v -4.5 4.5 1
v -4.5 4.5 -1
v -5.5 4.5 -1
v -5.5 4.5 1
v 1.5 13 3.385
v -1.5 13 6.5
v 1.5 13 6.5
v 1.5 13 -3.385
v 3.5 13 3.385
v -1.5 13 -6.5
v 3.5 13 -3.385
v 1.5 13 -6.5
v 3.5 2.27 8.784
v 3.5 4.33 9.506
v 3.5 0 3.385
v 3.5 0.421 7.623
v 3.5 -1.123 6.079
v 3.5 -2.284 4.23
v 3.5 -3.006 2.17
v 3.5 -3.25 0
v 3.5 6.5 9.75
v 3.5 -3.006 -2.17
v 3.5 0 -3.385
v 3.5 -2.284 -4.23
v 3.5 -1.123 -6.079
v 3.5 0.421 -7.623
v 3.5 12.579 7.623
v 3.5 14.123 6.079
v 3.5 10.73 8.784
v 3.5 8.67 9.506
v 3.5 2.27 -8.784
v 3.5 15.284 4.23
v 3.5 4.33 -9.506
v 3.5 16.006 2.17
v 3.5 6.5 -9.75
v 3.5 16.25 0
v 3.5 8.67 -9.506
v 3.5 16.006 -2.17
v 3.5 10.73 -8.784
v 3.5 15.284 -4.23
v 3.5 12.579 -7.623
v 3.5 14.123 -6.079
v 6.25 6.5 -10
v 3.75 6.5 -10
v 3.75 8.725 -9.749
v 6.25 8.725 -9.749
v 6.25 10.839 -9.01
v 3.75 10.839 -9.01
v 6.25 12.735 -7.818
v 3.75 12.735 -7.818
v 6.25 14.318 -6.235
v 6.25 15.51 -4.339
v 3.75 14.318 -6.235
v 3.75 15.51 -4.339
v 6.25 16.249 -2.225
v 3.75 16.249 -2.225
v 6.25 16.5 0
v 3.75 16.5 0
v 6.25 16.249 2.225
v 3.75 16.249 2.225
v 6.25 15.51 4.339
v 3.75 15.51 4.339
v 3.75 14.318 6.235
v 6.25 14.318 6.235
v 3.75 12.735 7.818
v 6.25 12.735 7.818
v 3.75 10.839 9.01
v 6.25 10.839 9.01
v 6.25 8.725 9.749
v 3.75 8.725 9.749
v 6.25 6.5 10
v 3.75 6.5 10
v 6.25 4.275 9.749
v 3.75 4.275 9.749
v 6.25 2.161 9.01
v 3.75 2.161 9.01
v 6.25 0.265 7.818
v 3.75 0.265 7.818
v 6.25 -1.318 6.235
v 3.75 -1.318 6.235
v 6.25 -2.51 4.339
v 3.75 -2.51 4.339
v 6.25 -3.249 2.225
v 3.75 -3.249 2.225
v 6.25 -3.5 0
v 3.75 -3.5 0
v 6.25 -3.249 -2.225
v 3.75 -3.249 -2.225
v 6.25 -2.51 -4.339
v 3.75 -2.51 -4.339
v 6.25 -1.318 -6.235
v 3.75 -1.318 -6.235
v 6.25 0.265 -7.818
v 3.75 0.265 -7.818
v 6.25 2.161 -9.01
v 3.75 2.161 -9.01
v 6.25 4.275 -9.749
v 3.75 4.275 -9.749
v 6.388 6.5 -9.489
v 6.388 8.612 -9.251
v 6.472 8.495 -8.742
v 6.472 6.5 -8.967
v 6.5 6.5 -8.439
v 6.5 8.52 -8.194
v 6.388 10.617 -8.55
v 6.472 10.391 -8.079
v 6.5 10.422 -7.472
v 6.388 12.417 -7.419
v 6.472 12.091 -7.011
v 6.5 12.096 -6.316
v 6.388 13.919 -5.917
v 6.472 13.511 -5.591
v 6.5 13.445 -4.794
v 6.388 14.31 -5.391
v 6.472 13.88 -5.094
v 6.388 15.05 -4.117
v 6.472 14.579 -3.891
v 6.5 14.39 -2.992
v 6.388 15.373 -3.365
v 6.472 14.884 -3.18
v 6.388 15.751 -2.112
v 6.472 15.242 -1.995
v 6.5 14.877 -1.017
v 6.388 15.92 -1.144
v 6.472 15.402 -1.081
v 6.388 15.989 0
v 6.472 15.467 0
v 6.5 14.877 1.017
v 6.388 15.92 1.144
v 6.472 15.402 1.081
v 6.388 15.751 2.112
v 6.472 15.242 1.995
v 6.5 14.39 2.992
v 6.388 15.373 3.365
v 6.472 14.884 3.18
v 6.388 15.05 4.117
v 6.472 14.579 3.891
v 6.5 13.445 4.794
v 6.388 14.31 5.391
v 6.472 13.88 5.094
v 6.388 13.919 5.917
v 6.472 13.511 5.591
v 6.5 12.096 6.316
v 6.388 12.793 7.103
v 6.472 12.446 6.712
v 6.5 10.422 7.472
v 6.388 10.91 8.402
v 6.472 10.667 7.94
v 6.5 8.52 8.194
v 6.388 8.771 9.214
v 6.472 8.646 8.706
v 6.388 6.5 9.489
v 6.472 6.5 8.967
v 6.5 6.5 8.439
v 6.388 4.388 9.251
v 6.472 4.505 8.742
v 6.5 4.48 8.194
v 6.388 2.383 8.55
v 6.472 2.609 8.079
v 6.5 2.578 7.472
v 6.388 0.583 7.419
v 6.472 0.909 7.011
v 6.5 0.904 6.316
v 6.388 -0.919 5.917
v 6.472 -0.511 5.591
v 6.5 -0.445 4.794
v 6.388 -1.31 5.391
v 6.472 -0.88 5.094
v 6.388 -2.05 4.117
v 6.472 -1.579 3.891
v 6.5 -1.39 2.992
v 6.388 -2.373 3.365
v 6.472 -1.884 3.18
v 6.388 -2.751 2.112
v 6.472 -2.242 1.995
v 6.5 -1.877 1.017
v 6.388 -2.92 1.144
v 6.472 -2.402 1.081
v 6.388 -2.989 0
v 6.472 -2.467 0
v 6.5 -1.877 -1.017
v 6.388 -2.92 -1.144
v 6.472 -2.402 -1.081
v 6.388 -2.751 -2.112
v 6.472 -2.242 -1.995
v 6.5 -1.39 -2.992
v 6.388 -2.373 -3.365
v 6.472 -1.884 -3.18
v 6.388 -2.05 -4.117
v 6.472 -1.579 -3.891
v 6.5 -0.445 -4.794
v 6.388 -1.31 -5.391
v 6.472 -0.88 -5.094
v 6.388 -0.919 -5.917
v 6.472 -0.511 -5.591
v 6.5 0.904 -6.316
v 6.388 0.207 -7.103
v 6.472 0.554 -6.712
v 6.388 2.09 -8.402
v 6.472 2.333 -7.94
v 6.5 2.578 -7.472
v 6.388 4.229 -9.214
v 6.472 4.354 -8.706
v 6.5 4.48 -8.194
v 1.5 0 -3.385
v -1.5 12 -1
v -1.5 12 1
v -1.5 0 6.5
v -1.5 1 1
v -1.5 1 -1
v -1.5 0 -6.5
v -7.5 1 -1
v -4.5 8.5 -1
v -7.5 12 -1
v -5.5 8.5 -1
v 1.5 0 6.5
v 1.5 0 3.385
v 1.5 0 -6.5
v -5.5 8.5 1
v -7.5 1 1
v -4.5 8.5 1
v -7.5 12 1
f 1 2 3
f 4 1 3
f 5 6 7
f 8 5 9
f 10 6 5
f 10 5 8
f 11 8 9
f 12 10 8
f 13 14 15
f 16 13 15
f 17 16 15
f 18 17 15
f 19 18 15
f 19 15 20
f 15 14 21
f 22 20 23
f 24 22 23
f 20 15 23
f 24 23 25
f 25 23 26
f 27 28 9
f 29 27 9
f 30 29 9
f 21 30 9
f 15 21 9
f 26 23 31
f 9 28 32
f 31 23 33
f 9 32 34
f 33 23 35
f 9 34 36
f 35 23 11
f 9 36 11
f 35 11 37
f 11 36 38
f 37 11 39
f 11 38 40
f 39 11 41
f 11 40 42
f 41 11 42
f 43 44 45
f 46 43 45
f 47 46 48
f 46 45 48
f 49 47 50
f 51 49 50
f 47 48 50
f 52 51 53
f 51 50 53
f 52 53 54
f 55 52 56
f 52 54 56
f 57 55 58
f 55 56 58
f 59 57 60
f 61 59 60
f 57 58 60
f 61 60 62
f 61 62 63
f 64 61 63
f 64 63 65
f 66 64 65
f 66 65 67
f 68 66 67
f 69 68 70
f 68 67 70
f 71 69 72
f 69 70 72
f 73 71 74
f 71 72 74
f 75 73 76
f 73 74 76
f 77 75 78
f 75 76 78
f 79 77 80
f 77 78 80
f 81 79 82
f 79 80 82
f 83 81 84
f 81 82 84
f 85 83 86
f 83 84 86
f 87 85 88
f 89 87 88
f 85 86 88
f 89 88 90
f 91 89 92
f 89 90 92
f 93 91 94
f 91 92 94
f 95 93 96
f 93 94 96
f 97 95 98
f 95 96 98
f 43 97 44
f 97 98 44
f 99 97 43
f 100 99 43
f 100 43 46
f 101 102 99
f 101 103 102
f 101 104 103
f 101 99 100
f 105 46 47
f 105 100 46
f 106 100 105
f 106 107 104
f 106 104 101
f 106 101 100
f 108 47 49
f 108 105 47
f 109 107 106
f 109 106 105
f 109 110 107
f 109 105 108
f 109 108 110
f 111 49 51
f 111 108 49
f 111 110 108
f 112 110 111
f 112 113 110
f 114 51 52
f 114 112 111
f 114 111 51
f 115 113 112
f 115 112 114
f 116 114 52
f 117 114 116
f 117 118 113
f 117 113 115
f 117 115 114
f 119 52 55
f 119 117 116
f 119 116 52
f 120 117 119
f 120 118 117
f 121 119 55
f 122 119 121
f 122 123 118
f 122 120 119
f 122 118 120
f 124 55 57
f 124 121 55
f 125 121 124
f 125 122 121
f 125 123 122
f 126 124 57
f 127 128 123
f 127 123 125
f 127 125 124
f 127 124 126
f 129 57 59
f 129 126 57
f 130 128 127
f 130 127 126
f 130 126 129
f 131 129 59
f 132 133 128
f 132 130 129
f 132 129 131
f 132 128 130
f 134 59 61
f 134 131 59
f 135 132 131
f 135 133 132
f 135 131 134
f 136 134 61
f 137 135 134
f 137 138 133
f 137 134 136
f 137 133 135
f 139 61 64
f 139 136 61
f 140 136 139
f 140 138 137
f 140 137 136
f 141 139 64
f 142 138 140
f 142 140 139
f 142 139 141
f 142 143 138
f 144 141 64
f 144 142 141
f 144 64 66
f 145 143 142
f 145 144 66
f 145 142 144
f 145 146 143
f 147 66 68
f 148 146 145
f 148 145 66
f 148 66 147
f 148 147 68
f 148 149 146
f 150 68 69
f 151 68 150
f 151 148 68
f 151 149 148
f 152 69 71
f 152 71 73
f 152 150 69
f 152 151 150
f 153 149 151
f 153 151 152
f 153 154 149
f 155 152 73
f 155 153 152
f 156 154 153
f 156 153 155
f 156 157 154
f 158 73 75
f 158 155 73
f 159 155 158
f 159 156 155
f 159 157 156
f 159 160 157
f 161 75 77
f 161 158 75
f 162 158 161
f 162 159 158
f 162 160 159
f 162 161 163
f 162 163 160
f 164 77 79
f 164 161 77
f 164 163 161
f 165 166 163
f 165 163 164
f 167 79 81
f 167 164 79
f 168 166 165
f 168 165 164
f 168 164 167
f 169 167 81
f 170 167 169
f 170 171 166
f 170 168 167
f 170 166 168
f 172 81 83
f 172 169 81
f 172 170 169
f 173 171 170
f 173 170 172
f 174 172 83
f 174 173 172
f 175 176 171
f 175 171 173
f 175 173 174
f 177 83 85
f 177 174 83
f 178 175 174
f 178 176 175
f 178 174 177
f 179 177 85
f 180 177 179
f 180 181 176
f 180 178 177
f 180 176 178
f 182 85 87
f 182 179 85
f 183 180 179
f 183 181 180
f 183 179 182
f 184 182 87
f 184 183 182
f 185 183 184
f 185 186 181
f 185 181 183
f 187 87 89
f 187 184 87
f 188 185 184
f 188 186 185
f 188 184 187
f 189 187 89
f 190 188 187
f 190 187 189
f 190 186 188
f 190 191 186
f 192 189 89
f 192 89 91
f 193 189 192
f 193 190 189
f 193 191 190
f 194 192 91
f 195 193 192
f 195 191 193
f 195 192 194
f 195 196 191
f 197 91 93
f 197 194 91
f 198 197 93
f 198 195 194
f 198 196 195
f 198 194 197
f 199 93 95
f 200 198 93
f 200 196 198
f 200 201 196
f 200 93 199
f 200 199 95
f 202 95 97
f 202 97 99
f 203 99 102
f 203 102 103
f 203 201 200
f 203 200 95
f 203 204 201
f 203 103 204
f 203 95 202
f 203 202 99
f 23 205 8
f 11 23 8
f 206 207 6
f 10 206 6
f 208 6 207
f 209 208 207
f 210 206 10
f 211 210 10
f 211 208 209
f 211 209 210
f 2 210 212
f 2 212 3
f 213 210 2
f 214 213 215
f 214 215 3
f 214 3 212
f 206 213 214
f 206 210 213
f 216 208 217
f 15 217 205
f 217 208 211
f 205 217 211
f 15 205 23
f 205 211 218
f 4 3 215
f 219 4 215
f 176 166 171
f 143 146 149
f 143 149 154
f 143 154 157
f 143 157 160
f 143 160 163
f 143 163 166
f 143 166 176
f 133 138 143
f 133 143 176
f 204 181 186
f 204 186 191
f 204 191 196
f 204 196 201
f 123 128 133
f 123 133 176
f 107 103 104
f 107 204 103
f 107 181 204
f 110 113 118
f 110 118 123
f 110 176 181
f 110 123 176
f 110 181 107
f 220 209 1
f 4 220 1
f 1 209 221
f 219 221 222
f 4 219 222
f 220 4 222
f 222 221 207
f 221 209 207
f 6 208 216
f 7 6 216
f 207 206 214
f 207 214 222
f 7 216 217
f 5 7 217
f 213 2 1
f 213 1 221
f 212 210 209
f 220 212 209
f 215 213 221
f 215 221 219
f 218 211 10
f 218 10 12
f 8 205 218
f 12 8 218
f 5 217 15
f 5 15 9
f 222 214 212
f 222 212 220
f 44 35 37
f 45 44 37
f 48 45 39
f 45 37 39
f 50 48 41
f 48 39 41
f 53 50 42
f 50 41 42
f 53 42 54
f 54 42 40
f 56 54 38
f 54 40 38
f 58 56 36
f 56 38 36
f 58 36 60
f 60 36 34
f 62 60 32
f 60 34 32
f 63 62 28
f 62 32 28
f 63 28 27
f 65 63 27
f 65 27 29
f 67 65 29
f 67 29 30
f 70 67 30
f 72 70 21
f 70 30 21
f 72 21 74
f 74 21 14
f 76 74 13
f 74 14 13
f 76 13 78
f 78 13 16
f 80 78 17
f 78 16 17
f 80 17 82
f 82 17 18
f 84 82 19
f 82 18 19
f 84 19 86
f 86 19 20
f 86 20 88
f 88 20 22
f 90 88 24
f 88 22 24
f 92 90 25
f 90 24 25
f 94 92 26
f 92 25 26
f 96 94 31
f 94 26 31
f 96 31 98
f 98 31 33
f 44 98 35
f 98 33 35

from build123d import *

# Parameters (mm, degrees)
SZKIC1_W                    = 3
SZKIC1_H                    = 13
DODANIE_WYCI_GNI_CIE2_DEPTH = 13
SZKIC3_W                    = 6.769810996
SZKIC3_H                    = 13
DODANIE_WYCI_GNI_CIE3_DEPTH = 2
SZKIC4_R                    = 10
DODANIE_WYCI_GNI_CIE4_DEPTH = 3
SFAZOWANIE1_SIZE            = 0.25
SFAZOWANIE2_SIZE            = 0.25
ZAOKR_GLENIE2_R             = 5
SZKIC5_W                    = 2
SZKIC5_H                    = 11
DODANIE_WYCI_GNI_CIE5_DEPTH = 6
SZKIC8_W                    = 1
SZKIC8_H                    = 4
WYTNIJ_WYCI_GNI_CIE1_DEPTH  = 6


with BuildPart() as part:
    # Szkic1 → Dodanie-wyciągnięcie2 (new body)
    with BuildSketch(Plane(origin=(0, 0, 0), x_dir=(1, 0, 0), z_dir=(0, 1, 0))):
        Rectangle(SZKIC1_W, SZKIC1_H)
    extrude(amount=DODANIE_WYCI_GNI_CIE2_DEPTH)

    # Szkic3 → Dodanie-wyciągnięcie3 (add)
    with BuildSketch(Plane(origin=(1.5, 0, 0), x_dir=(0, 0, -1), z_dir=(1, 0, 0))):
        with Locations((0, 6.5)):
            Rectangle(SZKIC3_W, SZKIC3_H)
    extrude(amount=DODANIE_WYCI_GNI_CIE3_DEPTH)

    # Szkic4 → Dodanie-wyciągnięcie4 (add)
    with BuildSketch(Plane(origin=(3.5, 0, 0), x_dir=(0, 0, -1), z_dir=(1, 0, 0))):
        with Locations((0, 6.5)):
            Circle(SZKIC4_R)
    extrude(amount=DODANIE_WYCI_GNI_CIE4_DEPTH)

    # Sfazowanie1
    sfazowanie1_edges = [part.edges().sort_by_distance(p)[0] for p in [
        (6.5, 6.5, 10),
    ]]
    chamfer(sfazowanie1_edges, length=SFAZOWANIE1_SIZE)

    # Sfazowanie2
    sfazowanie2_edges = [part.edges().sort_by_distance(p)[0] for p in [
        (3.5, 6.5, 10),
    ]]
    chamfer(sfazowanie2_edges, length=SFAZOWANIE2_SIZE)

    # Zaokrąglenie2
    # the kernel refuses this fillet: 5 mm, written as the material it takes off along each edge
    with BuildSketch(Plane(origin=(6.5, 6.5, 0), x_dir=(0, 0, -1), z_dir=(0, -1, 0))) as zaokr_glenie2_piece_1:
        with BuildLine():
            CenterArc((8.4387505, -5), ZAOKR_GLENIE2_R, 71.805127661, 18.194872339)
            Line((8.4387505, 0), (8.4387505, 0.1))
            Line((8.4387505, 0.1), (9.75, 0.1))
            Line((9.75, 0.1), (9.820710678, 0.070710678))
            ThreePointArc((9.820710678, 0.070710678), (9.945710678, -0.054289322), (10.03122499, -0.155))
            Line((10.03122499, -0.155), (10, -0.25))
        make_face()
    revolve(axis=Axis((6.5, 6.5, 0), (1, 0, 0)), mode=Mode.SUBTRACT)

    # Szkic5 → Dodanie-wyciągnięcie5 (add)
    with BuildSketch(Plane.ZY.offset(1.5)):
        with Locations((0, 6.5)):
            Rectangle(SZKIC5_W, SZKIC5_H)
    extrude(amount=DODANIE_WYCI_GNI_CIE5_DEPTH)

    # Szkic8 → Wytnij-wyciągnięcie1 (cut)
    with BuildSketch(Plane(origin=(0, 0, -1), x_dir=(-1, 0, 0), z_dir=(0, 0, -1))):
        with Locations((5, 6.5)):
            Rectangle(SZKIC8_W, SZKIC8_H)
    extrude(amount=-WYTNIJ_WYCI_GNI_CIE1_DEPTH, mode=Mode.SUBTRACT)


solid = part.part
